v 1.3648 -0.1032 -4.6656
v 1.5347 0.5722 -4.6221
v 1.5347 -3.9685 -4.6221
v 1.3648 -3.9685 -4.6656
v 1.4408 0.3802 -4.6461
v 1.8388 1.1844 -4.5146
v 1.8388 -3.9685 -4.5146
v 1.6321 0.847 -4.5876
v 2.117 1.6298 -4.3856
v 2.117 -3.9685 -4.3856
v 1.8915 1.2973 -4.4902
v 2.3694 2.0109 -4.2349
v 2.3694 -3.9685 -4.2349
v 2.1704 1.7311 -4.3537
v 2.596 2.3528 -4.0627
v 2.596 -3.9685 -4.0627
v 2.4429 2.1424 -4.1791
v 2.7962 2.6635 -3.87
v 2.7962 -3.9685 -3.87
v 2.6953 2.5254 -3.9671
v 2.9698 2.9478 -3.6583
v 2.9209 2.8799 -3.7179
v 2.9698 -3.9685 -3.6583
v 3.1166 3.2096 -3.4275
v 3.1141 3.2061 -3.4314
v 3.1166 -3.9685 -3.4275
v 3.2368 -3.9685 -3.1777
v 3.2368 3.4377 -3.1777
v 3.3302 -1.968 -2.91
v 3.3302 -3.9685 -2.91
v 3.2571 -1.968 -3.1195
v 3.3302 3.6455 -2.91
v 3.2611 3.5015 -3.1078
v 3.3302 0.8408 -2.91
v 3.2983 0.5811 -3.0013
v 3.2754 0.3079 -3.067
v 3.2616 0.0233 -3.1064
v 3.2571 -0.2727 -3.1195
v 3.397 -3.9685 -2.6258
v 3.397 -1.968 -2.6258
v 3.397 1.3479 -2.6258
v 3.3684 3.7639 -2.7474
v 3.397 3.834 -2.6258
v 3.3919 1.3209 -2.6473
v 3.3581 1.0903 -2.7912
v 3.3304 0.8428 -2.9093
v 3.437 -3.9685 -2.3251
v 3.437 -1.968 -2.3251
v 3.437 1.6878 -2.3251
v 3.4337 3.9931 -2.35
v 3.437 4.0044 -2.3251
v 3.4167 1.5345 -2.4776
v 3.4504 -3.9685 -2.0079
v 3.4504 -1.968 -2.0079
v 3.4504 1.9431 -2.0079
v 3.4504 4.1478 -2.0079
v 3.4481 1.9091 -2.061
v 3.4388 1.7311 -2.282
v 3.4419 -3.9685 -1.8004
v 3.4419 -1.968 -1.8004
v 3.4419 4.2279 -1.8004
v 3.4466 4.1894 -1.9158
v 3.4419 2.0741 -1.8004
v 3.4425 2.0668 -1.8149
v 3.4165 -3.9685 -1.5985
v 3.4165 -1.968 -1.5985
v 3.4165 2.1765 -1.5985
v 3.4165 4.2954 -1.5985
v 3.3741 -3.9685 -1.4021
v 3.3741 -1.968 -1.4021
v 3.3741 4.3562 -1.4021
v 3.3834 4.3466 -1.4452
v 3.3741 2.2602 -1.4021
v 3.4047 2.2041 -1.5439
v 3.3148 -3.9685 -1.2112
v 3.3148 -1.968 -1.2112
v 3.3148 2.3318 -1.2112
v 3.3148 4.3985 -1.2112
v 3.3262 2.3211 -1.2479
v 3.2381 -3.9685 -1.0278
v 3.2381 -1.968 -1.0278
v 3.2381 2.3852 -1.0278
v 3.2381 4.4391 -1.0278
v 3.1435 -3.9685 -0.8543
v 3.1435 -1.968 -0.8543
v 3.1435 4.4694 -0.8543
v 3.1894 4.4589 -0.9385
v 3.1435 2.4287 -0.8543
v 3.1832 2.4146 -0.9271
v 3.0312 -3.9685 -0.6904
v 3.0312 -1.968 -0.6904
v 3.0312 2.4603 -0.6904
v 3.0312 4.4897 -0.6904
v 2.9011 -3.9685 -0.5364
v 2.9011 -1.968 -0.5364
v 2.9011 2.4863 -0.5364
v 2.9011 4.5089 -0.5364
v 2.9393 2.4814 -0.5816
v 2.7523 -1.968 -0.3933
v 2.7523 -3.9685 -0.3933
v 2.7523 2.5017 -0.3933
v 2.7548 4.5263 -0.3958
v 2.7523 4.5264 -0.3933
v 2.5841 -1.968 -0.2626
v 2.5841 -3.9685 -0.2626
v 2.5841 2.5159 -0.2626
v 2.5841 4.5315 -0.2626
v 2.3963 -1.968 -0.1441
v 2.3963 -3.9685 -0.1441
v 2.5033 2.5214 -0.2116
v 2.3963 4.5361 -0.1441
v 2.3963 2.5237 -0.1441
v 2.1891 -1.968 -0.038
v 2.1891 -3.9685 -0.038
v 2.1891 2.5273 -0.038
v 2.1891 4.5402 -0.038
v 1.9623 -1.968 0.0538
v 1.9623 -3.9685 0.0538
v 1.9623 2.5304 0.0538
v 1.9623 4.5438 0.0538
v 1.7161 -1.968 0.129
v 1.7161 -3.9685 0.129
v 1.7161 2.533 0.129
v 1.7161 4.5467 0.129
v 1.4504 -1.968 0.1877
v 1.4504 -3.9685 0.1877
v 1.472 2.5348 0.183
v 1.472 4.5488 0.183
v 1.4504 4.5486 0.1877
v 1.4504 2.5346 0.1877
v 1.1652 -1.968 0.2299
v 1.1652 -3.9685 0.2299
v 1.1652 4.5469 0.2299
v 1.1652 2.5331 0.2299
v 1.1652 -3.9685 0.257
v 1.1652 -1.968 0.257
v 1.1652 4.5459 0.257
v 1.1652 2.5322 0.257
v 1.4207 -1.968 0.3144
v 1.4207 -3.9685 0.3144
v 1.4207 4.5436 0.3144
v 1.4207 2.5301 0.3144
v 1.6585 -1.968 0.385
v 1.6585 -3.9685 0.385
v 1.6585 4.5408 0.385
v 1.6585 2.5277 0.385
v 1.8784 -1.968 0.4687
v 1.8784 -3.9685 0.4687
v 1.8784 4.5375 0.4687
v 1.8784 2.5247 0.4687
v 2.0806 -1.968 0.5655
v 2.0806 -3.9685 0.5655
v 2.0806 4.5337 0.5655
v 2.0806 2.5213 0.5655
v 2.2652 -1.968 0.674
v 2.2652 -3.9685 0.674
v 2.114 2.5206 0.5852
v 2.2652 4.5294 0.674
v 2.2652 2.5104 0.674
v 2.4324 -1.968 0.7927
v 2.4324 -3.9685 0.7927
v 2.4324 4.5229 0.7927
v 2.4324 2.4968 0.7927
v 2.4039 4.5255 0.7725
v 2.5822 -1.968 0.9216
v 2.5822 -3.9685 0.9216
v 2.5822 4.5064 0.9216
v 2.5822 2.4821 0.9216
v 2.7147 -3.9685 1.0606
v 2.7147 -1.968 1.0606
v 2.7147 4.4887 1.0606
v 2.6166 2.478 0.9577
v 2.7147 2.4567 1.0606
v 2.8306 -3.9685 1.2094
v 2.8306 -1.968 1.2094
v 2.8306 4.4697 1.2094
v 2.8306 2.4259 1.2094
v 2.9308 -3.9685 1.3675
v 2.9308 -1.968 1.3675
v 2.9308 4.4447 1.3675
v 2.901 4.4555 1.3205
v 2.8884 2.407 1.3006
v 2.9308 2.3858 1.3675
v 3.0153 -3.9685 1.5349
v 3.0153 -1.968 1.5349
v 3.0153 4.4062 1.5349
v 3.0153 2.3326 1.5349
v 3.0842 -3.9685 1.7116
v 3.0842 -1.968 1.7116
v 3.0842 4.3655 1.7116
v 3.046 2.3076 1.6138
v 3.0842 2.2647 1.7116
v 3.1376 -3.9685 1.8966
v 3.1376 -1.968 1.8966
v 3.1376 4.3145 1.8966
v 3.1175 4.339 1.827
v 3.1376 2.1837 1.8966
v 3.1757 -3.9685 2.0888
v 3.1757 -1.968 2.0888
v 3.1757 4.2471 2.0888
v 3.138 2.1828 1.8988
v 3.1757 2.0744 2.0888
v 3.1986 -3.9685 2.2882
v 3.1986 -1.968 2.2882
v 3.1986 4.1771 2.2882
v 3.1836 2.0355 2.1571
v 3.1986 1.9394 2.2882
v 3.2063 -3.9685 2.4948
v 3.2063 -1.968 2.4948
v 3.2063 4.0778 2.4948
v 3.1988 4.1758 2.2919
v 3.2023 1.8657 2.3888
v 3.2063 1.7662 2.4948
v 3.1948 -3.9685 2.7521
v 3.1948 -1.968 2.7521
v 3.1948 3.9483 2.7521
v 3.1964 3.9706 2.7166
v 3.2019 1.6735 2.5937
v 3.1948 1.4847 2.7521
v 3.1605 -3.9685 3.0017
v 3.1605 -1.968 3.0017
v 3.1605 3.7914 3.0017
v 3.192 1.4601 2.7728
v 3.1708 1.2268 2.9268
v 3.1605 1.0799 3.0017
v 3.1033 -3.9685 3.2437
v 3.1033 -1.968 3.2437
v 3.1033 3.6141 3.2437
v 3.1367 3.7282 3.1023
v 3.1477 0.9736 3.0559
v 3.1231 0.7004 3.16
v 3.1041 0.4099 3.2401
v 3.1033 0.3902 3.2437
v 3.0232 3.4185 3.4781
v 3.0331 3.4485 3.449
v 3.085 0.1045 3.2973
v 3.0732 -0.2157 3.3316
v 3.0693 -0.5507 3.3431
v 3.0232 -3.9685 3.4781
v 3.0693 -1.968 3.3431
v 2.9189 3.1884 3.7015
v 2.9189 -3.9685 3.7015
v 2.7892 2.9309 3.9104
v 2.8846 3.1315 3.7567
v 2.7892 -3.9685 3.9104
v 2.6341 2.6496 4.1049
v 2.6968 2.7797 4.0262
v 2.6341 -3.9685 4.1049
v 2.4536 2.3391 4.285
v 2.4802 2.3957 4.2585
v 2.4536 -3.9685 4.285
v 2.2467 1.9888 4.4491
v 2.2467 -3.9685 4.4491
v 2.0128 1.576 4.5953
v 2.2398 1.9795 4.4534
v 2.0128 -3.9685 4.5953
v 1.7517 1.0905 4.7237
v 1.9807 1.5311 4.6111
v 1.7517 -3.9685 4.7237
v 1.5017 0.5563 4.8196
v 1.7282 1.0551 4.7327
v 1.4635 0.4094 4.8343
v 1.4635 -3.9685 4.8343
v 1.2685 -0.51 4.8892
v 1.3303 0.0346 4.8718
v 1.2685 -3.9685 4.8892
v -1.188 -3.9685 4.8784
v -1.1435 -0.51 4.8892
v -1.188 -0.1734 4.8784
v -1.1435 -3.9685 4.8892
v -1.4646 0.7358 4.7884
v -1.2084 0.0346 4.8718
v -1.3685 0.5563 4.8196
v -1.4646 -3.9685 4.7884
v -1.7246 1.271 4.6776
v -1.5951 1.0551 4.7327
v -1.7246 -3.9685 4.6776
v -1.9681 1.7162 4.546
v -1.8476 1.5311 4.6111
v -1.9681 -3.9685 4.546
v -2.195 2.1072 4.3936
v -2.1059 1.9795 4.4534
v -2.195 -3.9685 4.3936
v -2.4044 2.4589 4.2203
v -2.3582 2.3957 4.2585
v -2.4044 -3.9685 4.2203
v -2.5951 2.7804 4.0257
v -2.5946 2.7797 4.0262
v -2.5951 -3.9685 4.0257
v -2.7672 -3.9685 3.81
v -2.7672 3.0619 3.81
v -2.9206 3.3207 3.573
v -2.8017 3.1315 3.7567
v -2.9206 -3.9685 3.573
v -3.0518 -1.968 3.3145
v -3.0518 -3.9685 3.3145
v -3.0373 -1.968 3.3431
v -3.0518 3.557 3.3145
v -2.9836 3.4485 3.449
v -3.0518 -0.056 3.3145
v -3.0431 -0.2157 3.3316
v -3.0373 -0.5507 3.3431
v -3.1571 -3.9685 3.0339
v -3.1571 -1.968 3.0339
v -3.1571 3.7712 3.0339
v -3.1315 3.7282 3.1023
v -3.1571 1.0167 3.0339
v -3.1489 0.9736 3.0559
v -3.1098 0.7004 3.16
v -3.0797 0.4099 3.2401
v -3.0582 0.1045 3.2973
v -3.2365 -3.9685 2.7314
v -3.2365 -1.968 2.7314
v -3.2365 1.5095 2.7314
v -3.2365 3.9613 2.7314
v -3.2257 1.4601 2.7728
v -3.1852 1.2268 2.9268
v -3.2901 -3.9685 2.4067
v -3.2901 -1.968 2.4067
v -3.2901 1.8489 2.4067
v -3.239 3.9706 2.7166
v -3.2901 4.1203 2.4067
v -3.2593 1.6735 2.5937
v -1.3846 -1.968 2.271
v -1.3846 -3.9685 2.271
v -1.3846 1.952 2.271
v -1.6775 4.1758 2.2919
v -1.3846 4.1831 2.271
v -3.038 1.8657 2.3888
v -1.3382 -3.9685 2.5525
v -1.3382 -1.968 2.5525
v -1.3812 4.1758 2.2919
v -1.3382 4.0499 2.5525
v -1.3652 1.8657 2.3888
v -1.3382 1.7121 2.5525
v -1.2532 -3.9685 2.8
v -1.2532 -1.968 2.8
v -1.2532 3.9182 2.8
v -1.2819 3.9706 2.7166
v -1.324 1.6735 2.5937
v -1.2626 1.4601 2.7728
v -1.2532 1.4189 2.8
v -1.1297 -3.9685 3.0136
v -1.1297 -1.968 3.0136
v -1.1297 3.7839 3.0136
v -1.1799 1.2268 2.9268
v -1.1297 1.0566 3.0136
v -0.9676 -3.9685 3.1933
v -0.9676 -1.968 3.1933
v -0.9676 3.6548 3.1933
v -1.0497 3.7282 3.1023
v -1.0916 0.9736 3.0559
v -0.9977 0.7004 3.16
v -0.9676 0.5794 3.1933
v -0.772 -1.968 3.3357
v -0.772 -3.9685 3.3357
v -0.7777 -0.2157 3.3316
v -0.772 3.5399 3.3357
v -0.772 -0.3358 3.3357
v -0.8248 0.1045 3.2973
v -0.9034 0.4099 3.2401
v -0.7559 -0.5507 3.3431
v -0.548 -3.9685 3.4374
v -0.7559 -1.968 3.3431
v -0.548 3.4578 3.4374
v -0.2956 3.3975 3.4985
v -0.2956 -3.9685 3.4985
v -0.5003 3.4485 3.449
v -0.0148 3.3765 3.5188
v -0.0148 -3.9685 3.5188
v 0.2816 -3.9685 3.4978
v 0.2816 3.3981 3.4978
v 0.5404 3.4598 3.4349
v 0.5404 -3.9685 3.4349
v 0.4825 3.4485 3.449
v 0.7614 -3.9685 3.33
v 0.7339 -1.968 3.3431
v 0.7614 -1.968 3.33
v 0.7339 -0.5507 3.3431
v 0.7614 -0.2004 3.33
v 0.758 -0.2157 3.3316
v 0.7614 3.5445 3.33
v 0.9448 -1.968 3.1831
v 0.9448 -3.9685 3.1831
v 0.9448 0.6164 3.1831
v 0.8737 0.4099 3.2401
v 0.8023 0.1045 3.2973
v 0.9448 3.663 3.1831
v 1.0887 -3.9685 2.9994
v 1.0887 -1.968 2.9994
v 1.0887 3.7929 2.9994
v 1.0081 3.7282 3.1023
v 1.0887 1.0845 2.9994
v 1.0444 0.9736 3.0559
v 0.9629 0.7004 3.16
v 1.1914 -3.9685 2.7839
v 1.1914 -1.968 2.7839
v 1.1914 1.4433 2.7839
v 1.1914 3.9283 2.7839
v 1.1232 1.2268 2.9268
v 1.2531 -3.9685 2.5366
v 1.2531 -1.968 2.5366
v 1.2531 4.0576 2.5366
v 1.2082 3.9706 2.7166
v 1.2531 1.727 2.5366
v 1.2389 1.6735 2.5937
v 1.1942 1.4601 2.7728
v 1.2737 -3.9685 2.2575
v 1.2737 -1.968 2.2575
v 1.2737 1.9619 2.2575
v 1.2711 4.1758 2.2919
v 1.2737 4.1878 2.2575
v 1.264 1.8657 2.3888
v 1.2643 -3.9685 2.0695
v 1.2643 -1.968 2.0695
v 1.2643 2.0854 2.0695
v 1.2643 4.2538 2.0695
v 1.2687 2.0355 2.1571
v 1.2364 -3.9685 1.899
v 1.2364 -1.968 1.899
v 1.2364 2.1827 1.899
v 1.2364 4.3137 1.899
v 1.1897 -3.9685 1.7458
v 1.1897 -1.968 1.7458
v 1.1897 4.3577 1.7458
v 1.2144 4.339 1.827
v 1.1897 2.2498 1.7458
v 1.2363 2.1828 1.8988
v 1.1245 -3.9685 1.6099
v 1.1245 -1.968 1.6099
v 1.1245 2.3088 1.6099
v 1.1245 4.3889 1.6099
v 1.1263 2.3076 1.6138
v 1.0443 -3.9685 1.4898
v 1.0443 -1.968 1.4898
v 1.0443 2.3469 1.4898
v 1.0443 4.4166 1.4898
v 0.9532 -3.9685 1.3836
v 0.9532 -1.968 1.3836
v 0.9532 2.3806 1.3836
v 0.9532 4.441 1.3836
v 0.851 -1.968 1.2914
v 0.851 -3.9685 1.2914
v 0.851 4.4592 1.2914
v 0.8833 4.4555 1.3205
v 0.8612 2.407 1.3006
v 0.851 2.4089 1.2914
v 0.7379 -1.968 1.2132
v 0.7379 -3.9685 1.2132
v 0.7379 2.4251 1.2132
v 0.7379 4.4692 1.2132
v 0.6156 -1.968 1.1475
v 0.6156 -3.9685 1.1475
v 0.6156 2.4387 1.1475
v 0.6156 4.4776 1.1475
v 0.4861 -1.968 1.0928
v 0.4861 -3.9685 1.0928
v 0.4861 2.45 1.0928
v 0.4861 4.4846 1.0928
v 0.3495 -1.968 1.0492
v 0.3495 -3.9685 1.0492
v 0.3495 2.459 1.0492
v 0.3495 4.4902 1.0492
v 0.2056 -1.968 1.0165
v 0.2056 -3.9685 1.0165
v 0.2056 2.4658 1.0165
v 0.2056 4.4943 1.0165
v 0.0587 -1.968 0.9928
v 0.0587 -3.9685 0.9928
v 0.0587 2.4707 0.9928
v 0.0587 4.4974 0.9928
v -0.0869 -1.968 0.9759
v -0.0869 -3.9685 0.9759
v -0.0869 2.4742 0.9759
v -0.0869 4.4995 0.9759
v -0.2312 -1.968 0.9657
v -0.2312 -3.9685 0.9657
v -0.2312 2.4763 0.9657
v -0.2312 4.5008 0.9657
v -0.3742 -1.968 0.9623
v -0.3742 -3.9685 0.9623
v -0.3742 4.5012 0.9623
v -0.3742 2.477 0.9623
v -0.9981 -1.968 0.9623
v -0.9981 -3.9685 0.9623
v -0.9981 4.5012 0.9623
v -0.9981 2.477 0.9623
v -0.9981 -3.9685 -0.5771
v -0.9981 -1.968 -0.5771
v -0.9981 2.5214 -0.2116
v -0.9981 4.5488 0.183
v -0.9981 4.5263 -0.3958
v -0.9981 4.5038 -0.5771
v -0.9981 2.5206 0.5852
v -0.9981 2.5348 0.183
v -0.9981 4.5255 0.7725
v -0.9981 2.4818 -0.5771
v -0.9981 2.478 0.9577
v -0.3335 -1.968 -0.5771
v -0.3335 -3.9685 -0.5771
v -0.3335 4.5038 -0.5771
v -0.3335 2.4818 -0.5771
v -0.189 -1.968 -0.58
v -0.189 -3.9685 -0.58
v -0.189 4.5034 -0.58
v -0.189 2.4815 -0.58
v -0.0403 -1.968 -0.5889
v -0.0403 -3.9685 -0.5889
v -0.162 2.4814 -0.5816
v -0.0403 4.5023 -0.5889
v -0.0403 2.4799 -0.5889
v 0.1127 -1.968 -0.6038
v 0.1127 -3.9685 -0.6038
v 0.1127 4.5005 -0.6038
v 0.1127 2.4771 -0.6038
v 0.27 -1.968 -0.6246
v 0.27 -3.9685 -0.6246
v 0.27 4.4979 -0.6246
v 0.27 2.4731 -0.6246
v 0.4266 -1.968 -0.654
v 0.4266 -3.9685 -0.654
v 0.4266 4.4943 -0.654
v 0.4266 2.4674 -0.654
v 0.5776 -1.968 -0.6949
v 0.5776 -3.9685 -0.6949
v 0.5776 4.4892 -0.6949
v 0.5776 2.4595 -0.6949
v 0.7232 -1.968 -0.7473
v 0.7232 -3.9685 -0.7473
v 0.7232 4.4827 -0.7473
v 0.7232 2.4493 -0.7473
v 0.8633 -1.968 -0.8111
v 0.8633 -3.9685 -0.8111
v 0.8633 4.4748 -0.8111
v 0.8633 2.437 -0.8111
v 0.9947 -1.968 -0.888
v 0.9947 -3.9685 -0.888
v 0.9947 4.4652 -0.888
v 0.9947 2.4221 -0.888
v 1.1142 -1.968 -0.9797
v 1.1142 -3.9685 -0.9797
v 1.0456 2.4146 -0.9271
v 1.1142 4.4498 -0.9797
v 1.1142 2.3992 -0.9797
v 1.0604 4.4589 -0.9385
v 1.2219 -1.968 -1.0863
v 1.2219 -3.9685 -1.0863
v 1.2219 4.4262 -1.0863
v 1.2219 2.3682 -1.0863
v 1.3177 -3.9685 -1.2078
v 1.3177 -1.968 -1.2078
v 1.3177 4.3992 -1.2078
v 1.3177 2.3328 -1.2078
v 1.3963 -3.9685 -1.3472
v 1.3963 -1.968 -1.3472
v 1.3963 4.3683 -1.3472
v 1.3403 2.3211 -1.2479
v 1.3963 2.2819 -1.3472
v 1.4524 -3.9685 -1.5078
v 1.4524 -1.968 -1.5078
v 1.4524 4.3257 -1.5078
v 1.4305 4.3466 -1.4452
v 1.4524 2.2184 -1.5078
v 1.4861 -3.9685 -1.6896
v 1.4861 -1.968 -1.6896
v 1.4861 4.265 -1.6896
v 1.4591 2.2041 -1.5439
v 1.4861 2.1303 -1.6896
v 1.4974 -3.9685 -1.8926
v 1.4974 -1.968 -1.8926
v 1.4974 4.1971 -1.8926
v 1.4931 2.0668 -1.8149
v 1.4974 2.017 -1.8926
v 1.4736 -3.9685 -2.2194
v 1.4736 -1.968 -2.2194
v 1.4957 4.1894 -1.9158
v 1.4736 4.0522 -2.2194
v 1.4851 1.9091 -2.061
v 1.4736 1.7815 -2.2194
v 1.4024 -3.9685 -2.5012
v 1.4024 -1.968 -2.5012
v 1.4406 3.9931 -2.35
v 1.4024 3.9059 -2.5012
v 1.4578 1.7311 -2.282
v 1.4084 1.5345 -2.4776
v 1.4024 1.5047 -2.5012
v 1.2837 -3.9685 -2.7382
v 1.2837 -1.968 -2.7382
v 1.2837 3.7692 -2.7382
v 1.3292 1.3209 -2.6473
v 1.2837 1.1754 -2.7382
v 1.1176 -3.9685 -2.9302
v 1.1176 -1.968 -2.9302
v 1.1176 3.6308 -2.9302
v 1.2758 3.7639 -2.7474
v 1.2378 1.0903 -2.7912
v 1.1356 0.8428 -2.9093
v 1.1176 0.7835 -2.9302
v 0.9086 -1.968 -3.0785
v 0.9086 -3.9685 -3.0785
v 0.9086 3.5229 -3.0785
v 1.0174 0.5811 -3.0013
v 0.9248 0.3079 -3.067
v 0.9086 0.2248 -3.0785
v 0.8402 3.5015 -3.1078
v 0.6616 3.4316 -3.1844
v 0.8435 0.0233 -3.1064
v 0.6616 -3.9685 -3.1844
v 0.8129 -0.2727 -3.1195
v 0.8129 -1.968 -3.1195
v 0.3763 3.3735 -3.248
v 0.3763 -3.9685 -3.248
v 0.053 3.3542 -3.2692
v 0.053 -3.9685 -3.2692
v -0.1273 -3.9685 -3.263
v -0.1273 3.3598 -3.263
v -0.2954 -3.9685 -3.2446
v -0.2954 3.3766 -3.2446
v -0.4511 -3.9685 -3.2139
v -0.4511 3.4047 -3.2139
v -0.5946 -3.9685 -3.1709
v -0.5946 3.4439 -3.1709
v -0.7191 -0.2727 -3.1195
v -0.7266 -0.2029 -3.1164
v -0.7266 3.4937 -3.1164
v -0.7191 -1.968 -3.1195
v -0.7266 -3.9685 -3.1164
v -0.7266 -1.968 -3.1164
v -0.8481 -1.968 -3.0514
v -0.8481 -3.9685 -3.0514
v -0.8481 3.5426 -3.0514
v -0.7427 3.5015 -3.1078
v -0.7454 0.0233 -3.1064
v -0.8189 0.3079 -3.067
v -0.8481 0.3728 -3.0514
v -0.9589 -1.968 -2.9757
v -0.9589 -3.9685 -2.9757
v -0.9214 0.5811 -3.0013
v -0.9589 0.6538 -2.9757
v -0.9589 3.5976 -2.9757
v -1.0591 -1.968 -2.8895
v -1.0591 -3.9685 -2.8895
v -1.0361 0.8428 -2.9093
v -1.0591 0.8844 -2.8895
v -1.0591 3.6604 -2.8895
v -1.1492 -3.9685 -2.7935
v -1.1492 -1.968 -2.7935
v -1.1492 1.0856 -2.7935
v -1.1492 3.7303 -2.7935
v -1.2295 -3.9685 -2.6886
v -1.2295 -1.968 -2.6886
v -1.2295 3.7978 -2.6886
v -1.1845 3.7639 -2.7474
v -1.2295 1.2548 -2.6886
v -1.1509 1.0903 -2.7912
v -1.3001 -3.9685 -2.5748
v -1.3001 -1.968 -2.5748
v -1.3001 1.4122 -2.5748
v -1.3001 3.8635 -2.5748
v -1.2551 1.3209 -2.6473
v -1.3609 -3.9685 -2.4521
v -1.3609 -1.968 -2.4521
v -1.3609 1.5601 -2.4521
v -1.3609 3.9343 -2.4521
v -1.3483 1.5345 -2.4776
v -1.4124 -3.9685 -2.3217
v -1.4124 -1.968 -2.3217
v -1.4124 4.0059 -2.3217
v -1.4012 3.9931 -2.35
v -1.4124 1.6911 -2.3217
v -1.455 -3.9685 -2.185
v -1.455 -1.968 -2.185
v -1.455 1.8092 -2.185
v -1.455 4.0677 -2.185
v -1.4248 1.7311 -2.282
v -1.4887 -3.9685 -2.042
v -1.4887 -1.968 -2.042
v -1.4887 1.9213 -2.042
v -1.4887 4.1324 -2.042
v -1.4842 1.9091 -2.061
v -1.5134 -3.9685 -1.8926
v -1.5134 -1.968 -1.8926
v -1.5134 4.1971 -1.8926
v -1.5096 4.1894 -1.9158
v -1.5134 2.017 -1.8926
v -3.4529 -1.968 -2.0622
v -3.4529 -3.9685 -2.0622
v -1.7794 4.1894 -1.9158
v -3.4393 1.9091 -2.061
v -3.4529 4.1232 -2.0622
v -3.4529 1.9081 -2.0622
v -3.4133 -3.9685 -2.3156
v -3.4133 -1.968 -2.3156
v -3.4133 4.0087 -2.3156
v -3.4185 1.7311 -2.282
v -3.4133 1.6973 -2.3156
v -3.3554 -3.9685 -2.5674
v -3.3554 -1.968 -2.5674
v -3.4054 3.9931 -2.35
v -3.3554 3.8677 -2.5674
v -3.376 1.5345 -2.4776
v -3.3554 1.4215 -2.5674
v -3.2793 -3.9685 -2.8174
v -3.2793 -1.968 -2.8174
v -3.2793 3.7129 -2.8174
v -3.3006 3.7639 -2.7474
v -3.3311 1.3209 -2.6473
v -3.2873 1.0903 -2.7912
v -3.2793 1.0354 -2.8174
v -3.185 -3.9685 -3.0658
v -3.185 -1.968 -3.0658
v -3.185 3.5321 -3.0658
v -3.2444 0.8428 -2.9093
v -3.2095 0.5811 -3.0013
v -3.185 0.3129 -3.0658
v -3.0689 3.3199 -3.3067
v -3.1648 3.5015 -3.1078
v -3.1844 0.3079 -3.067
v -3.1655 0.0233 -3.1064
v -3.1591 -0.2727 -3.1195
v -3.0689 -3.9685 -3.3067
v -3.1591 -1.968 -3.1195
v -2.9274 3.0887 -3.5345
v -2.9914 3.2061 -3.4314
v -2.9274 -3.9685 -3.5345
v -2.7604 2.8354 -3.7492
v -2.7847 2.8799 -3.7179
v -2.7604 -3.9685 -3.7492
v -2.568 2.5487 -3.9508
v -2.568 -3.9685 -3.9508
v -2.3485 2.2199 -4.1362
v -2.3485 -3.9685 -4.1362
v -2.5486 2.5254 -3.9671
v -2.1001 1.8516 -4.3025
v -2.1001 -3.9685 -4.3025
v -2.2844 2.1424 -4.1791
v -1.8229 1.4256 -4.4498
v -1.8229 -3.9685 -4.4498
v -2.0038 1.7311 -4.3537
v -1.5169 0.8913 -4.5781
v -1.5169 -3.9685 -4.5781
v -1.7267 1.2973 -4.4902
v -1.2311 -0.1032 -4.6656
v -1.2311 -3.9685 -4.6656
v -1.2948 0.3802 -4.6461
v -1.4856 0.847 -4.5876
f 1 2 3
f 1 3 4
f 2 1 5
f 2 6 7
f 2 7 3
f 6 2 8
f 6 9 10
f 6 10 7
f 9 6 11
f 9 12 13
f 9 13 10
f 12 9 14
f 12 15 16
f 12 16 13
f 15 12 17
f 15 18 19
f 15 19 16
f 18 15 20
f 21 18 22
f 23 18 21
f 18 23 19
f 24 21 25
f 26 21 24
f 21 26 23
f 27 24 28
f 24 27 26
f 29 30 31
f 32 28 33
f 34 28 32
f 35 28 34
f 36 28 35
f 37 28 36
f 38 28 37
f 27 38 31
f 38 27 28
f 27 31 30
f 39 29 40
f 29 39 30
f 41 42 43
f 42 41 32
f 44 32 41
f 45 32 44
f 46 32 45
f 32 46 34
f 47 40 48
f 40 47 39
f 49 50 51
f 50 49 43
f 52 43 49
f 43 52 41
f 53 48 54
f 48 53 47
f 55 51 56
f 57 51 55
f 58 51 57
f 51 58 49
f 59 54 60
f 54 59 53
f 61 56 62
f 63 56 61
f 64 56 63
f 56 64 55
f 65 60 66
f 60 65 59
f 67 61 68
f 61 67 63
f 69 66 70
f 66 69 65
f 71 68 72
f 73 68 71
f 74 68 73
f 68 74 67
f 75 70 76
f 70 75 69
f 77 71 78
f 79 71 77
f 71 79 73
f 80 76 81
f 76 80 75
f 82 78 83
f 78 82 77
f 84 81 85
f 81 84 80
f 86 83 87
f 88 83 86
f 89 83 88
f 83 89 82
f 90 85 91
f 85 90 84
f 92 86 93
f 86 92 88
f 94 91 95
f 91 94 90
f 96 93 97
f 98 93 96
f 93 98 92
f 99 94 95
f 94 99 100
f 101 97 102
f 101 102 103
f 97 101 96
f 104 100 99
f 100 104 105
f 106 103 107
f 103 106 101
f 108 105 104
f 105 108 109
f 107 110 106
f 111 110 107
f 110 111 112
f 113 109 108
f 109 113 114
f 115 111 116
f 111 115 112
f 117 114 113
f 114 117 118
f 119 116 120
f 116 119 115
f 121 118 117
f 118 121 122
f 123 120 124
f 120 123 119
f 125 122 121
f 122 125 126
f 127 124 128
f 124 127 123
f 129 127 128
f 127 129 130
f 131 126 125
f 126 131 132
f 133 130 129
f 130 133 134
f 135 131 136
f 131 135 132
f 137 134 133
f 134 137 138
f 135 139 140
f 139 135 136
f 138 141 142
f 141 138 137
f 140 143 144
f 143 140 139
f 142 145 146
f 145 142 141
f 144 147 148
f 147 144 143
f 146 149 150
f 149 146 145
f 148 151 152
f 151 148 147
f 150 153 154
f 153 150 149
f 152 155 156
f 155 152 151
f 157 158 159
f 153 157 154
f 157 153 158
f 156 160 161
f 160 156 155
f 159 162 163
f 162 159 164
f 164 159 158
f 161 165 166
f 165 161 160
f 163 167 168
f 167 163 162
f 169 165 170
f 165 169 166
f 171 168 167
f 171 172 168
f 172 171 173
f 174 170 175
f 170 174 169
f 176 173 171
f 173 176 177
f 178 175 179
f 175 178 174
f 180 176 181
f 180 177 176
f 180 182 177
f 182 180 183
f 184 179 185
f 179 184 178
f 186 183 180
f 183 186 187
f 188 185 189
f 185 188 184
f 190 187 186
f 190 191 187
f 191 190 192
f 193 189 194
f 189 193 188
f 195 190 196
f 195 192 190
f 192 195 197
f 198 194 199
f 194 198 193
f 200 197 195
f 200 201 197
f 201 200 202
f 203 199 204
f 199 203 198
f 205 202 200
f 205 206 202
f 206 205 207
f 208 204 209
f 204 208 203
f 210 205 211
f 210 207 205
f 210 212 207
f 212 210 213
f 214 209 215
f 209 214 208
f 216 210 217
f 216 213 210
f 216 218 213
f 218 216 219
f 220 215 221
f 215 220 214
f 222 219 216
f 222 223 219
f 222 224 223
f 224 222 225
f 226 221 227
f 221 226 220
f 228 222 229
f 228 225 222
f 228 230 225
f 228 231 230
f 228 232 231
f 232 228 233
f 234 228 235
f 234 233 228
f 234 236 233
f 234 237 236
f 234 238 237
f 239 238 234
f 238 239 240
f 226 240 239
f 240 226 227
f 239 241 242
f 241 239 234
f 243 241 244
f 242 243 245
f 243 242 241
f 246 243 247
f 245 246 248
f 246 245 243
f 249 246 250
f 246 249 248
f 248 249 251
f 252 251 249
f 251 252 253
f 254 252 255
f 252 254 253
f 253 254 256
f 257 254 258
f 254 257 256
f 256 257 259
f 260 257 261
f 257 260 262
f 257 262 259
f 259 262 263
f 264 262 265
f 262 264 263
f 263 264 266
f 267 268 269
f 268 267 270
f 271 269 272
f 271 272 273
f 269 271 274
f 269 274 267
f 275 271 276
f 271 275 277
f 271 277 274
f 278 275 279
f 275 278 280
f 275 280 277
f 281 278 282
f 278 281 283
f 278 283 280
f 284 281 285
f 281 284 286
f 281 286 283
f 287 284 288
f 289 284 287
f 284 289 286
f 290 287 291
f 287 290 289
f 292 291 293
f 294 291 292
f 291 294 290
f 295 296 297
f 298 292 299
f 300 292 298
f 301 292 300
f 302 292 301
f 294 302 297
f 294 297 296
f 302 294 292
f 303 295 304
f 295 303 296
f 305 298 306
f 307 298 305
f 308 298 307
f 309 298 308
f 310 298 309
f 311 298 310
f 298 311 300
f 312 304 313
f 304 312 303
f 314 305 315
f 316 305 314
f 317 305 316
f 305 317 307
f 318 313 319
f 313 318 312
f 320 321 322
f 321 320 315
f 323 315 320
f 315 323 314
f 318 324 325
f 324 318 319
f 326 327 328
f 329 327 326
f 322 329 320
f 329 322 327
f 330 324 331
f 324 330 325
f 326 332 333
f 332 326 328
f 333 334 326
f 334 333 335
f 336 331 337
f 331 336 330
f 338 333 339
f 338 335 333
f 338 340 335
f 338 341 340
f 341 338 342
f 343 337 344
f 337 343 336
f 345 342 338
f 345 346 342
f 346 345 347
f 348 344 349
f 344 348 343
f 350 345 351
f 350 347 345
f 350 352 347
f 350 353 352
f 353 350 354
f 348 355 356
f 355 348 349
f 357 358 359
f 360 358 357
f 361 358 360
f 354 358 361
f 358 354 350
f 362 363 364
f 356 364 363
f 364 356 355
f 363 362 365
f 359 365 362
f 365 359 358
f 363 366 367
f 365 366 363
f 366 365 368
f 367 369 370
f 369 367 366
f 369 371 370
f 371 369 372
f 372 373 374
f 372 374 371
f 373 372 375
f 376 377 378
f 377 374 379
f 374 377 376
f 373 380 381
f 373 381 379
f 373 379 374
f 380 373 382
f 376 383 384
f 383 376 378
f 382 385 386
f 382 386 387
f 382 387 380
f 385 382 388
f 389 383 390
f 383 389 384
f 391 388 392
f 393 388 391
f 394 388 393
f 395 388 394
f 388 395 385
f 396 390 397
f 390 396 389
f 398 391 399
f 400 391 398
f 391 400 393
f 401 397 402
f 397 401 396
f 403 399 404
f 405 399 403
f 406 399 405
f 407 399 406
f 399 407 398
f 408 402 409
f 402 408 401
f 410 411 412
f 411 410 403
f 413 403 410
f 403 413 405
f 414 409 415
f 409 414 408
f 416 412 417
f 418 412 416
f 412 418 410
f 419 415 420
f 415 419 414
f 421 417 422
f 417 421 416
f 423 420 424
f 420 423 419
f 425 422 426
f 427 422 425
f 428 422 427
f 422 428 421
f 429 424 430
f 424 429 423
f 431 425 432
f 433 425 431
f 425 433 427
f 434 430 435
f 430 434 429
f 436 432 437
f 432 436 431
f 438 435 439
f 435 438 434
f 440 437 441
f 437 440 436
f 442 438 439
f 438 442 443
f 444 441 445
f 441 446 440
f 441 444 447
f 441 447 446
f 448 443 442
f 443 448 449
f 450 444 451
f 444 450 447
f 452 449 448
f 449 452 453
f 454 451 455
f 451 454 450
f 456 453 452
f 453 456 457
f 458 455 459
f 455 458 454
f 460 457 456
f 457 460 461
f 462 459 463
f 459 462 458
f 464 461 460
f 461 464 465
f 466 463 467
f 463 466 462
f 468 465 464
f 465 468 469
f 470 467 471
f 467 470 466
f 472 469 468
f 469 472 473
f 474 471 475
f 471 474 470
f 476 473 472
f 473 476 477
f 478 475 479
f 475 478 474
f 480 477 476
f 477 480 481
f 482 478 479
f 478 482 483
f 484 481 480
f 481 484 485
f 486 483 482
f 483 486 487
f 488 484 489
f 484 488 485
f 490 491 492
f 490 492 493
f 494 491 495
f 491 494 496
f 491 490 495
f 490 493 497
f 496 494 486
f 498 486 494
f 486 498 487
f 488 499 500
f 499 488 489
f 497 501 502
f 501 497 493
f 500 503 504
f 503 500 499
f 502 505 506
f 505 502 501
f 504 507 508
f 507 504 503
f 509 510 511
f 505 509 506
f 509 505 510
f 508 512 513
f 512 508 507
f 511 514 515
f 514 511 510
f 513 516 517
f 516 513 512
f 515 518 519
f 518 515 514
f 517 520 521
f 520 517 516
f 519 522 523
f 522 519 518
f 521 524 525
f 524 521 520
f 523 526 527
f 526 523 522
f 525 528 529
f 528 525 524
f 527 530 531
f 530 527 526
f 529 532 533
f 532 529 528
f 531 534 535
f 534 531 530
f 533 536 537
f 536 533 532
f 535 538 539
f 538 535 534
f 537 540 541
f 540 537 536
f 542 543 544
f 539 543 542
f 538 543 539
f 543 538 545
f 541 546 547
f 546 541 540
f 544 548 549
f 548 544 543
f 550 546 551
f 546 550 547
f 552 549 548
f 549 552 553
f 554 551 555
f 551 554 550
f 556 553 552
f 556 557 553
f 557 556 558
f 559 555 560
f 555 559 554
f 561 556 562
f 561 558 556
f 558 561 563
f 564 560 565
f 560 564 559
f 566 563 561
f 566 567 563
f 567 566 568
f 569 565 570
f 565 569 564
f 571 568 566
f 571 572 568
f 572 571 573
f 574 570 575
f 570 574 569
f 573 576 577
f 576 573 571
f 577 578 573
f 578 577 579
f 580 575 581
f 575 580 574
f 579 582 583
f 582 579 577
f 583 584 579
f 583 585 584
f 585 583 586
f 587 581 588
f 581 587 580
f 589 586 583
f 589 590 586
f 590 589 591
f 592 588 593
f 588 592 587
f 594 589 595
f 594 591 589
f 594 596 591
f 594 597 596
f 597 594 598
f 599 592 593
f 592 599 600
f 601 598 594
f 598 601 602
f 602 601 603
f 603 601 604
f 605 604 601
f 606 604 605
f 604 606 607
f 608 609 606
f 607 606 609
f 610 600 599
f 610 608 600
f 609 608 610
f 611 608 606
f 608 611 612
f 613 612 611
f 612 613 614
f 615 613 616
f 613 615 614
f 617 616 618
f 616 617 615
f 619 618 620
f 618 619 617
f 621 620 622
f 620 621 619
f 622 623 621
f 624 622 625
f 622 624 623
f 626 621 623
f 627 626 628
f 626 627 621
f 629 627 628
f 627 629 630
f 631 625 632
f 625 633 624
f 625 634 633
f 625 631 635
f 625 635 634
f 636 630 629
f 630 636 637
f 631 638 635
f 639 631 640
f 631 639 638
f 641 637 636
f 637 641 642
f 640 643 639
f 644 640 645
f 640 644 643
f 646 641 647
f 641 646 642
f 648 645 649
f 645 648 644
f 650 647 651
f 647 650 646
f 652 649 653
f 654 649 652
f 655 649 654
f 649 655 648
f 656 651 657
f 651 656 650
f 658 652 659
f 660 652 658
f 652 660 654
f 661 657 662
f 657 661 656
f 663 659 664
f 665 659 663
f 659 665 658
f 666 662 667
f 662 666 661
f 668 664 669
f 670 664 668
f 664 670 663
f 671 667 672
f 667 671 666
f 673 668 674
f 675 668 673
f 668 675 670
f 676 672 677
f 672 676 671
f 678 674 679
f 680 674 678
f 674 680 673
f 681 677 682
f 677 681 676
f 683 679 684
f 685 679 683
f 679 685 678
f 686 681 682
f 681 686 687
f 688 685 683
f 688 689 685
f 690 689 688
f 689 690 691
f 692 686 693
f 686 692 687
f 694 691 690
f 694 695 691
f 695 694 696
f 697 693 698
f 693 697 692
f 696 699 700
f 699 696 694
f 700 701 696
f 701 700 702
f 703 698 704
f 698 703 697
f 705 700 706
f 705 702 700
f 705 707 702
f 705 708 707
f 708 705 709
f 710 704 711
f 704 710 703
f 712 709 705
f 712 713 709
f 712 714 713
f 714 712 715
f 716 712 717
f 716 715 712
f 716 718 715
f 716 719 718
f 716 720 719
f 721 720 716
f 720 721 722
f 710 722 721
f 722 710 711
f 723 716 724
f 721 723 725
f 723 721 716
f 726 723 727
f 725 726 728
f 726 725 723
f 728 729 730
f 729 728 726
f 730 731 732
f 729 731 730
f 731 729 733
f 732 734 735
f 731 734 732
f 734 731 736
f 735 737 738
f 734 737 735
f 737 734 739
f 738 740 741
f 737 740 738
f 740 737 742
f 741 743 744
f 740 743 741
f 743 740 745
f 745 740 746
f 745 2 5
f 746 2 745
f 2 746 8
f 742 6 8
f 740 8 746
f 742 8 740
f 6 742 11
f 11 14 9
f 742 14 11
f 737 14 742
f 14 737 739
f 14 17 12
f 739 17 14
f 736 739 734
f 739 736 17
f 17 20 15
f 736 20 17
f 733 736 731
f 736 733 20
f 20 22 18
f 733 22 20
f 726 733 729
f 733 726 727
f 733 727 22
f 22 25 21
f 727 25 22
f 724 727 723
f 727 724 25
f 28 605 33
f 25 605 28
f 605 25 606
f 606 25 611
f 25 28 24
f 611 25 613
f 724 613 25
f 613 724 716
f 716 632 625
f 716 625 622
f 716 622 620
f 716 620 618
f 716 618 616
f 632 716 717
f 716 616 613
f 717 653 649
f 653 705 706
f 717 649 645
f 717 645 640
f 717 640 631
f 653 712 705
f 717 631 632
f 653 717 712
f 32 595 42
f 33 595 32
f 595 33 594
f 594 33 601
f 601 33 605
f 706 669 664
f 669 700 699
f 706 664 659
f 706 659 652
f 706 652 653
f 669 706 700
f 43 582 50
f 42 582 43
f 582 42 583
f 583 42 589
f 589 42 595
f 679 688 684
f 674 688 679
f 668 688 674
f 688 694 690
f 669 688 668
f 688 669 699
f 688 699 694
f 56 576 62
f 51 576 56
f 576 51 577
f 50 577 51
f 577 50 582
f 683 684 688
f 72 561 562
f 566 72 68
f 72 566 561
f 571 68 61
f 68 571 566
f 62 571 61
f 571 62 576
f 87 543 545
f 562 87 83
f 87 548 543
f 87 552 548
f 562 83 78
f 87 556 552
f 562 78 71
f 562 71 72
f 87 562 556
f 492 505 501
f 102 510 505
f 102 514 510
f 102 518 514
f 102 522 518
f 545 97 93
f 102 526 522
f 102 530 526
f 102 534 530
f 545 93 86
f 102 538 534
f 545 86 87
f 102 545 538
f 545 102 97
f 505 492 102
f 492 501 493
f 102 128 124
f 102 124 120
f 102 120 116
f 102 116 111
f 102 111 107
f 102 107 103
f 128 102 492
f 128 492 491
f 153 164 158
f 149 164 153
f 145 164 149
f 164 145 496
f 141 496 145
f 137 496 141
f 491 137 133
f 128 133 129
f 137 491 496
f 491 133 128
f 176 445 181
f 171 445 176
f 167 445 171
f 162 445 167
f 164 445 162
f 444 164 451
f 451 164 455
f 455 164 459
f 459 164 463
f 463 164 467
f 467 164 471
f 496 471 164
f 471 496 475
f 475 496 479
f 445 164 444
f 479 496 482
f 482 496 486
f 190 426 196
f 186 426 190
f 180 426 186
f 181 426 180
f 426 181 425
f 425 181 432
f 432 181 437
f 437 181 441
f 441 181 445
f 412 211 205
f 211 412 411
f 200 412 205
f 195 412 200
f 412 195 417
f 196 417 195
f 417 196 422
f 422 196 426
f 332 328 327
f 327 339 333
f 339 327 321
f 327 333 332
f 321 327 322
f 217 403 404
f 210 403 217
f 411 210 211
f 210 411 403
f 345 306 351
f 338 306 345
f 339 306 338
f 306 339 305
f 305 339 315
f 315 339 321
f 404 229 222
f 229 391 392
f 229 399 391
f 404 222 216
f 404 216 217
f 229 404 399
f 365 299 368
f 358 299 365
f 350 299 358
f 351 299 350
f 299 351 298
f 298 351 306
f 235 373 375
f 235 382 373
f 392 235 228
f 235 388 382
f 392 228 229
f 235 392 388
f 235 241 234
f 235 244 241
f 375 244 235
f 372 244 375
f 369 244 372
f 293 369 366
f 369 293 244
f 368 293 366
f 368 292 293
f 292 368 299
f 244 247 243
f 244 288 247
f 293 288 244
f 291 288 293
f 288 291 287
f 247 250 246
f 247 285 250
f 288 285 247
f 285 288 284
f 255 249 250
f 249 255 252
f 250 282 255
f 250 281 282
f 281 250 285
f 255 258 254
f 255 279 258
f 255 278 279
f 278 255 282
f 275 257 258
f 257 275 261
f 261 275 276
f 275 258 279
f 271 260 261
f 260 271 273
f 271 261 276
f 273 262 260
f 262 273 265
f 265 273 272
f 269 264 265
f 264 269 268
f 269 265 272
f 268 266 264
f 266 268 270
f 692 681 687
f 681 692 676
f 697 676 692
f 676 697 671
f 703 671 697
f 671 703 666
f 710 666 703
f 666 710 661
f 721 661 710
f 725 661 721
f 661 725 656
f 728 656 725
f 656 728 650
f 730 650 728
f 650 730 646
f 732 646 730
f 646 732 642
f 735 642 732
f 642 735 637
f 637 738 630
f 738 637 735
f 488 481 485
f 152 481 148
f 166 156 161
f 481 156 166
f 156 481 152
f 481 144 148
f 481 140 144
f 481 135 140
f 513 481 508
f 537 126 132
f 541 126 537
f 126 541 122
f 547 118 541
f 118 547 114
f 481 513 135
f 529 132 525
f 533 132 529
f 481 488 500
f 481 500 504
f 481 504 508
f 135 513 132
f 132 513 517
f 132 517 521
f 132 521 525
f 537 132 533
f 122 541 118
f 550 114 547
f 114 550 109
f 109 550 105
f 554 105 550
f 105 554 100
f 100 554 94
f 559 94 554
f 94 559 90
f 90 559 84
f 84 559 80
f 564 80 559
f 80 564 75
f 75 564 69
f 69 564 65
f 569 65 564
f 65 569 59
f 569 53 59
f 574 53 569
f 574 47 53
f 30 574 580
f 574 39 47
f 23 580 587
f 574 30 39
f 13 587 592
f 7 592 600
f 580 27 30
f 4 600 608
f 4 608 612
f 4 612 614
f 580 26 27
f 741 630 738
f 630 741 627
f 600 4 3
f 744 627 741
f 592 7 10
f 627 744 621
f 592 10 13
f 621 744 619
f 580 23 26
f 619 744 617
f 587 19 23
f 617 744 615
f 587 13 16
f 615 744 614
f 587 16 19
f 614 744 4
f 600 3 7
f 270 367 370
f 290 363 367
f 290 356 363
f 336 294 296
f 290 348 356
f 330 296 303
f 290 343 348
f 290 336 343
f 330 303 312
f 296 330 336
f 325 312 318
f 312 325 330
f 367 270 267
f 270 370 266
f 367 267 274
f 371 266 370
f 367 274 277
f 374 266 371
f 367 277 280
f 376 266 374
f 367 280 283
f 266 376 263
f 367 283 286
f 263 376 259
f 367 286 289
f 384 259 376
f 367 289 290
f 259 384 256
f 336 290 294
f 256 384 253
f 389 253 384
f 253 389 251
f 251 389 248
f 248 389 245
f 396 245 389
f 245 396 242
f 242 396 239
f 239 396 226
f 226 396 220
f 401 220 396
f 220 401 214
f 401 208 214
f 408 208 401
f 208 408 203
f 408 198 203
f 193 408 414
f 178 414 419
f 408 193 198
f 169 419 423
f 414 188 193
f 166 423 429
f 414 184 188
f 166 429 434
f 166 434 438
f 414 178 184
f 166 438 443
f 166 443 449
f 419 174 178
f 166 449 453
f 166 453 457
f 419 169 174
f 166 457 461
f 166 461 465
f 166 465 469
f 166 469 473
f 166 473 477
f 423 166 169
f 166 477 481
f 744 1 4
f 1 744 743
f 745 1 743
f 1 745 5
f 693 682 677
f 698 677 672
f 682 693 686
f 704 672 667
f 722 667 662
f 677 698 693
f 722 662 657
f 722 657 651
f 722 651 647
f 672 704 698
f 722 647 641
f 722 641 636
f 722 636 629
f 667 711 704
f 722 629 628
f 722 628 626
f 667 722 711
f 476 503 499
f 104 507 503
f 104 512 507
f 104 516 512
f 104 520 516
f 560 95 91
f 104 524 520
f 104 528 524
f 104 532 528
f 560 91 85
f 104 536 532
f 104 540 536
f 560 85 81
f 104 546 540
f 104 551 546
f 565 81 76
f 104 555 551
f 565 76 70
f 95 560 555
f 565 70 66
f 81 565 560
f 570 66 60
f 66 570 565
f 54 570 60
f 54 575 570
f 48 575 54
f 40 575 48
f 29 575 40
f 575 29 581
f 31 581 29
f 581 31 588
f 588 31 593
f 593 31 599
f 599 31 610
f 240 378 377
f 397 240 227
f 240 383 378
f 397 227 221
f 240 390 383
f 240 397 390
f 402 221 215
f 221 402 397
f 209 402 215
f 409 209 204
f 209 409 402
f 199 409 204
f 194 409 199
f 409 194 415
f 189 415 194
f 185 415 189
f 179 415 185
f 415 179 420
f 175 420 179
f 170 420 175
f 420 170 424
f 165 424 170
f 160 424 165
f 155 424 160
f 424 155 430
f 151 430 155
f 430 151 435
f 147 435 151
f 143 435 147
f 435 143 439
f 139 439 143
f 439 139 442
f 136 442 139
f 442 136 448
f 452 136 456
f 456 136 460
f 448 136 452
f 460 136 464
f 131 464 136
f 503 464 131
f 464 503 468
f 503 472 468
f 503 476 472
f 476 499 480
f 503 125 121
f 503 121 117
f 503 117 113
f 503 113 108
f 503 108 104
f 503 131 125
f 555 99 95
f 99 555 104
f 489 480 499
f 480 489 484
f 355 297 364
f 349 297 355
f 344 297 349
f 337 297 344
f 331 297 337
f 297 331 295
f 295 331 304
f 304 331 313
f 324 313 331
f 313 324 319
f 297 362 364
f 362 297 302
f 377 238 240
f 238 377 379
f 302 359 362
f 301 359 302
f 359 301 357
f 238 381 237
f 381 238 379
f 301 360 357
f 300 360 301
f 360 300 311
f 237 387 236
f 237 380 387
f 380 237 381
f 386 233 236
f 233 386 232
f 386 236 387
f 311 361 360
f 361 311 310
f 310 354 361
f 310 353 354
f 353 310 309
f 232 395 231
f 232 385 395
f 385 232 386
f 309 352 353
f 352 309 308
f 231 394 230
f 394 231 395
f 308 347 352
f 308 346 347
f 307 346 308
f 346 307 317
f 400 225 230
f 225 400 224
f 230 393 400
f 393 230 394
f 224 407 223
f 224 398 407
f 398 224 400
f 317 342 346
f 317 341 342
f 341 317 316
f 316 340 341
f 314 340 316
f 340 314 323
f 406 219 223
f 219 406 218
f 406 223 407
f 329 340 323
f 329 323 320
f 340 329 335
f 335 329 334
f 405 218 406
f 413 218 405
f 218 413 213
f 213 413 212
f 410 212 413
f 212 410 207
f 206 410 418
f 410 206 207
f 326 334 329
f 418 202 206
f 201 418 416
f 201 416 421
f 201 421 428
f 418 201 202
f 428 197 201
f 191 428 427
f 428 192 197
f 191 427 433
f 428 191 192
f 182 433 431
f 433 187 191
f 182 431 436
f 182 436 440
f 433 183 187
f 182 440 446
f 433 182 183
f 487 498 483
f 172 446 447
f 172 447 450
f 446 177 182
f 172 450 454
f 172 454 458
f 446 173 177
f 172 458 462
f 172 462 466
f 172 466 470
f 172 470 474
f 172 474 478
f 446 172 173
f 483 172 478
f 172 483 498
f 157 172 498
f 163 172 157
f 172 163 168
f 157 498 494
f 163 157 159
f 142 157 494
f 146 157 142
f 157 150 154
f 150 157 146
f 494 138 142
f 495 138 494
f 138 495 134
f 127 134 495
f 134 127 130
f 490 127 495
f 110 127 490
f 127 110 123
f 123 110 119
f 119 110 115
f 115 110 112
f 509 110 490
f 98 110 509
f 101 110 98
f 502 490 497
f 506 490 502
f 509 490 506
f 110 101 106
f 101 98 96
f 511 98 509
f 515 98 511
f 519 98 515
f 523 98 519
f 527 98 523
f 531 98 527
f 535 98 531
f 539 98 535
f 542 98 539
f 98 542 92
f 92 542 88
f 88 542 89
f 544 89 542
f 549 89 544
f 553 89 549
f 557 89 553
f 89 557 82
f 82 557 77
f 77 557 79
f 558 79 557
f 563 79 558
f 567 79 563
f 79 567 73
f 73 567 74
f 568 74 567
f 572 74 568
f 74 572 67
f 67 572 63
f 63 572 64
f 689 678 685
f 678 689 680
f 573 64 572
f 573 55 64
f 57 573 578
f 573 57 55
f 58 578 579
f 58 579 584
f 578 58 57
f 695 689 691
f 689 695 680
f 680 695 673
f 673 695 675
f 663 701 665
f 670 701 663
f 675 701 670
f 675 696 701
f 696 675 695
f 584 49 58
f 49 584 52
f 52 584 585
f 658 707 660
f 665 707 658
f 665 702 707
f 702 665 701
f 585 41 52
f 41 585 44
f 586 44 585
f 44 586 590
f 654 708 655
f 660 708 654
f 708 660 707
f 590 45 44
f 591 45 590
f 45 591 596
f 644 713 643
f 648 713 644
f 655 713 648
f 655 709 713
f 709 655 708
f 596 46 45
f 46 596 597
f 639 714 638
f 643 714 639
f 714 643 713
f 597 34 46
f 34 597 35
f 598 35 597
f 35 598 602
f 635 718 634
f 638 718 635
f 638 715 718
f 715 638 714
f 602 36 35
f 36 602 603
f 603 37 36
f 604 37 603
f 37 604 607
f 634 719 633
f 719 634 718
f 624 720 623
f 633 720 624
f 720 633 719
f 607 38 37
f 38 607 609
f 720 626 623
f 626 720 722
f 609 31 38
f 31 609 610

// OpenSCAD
character1="3";
character2="D";

intersection() {
rotate([90,0,0]) linear_extrude(height = 100, center=true) text(character1, font = "arial:style=Bold", "center", size = 10, valign="center", halign="center");

rotate([90,0,90]) linear_extrude(height = 100, center=true) text(character2, font = "arial:style=Bold", "center", size = 10, valign="center", halign="center");
}
